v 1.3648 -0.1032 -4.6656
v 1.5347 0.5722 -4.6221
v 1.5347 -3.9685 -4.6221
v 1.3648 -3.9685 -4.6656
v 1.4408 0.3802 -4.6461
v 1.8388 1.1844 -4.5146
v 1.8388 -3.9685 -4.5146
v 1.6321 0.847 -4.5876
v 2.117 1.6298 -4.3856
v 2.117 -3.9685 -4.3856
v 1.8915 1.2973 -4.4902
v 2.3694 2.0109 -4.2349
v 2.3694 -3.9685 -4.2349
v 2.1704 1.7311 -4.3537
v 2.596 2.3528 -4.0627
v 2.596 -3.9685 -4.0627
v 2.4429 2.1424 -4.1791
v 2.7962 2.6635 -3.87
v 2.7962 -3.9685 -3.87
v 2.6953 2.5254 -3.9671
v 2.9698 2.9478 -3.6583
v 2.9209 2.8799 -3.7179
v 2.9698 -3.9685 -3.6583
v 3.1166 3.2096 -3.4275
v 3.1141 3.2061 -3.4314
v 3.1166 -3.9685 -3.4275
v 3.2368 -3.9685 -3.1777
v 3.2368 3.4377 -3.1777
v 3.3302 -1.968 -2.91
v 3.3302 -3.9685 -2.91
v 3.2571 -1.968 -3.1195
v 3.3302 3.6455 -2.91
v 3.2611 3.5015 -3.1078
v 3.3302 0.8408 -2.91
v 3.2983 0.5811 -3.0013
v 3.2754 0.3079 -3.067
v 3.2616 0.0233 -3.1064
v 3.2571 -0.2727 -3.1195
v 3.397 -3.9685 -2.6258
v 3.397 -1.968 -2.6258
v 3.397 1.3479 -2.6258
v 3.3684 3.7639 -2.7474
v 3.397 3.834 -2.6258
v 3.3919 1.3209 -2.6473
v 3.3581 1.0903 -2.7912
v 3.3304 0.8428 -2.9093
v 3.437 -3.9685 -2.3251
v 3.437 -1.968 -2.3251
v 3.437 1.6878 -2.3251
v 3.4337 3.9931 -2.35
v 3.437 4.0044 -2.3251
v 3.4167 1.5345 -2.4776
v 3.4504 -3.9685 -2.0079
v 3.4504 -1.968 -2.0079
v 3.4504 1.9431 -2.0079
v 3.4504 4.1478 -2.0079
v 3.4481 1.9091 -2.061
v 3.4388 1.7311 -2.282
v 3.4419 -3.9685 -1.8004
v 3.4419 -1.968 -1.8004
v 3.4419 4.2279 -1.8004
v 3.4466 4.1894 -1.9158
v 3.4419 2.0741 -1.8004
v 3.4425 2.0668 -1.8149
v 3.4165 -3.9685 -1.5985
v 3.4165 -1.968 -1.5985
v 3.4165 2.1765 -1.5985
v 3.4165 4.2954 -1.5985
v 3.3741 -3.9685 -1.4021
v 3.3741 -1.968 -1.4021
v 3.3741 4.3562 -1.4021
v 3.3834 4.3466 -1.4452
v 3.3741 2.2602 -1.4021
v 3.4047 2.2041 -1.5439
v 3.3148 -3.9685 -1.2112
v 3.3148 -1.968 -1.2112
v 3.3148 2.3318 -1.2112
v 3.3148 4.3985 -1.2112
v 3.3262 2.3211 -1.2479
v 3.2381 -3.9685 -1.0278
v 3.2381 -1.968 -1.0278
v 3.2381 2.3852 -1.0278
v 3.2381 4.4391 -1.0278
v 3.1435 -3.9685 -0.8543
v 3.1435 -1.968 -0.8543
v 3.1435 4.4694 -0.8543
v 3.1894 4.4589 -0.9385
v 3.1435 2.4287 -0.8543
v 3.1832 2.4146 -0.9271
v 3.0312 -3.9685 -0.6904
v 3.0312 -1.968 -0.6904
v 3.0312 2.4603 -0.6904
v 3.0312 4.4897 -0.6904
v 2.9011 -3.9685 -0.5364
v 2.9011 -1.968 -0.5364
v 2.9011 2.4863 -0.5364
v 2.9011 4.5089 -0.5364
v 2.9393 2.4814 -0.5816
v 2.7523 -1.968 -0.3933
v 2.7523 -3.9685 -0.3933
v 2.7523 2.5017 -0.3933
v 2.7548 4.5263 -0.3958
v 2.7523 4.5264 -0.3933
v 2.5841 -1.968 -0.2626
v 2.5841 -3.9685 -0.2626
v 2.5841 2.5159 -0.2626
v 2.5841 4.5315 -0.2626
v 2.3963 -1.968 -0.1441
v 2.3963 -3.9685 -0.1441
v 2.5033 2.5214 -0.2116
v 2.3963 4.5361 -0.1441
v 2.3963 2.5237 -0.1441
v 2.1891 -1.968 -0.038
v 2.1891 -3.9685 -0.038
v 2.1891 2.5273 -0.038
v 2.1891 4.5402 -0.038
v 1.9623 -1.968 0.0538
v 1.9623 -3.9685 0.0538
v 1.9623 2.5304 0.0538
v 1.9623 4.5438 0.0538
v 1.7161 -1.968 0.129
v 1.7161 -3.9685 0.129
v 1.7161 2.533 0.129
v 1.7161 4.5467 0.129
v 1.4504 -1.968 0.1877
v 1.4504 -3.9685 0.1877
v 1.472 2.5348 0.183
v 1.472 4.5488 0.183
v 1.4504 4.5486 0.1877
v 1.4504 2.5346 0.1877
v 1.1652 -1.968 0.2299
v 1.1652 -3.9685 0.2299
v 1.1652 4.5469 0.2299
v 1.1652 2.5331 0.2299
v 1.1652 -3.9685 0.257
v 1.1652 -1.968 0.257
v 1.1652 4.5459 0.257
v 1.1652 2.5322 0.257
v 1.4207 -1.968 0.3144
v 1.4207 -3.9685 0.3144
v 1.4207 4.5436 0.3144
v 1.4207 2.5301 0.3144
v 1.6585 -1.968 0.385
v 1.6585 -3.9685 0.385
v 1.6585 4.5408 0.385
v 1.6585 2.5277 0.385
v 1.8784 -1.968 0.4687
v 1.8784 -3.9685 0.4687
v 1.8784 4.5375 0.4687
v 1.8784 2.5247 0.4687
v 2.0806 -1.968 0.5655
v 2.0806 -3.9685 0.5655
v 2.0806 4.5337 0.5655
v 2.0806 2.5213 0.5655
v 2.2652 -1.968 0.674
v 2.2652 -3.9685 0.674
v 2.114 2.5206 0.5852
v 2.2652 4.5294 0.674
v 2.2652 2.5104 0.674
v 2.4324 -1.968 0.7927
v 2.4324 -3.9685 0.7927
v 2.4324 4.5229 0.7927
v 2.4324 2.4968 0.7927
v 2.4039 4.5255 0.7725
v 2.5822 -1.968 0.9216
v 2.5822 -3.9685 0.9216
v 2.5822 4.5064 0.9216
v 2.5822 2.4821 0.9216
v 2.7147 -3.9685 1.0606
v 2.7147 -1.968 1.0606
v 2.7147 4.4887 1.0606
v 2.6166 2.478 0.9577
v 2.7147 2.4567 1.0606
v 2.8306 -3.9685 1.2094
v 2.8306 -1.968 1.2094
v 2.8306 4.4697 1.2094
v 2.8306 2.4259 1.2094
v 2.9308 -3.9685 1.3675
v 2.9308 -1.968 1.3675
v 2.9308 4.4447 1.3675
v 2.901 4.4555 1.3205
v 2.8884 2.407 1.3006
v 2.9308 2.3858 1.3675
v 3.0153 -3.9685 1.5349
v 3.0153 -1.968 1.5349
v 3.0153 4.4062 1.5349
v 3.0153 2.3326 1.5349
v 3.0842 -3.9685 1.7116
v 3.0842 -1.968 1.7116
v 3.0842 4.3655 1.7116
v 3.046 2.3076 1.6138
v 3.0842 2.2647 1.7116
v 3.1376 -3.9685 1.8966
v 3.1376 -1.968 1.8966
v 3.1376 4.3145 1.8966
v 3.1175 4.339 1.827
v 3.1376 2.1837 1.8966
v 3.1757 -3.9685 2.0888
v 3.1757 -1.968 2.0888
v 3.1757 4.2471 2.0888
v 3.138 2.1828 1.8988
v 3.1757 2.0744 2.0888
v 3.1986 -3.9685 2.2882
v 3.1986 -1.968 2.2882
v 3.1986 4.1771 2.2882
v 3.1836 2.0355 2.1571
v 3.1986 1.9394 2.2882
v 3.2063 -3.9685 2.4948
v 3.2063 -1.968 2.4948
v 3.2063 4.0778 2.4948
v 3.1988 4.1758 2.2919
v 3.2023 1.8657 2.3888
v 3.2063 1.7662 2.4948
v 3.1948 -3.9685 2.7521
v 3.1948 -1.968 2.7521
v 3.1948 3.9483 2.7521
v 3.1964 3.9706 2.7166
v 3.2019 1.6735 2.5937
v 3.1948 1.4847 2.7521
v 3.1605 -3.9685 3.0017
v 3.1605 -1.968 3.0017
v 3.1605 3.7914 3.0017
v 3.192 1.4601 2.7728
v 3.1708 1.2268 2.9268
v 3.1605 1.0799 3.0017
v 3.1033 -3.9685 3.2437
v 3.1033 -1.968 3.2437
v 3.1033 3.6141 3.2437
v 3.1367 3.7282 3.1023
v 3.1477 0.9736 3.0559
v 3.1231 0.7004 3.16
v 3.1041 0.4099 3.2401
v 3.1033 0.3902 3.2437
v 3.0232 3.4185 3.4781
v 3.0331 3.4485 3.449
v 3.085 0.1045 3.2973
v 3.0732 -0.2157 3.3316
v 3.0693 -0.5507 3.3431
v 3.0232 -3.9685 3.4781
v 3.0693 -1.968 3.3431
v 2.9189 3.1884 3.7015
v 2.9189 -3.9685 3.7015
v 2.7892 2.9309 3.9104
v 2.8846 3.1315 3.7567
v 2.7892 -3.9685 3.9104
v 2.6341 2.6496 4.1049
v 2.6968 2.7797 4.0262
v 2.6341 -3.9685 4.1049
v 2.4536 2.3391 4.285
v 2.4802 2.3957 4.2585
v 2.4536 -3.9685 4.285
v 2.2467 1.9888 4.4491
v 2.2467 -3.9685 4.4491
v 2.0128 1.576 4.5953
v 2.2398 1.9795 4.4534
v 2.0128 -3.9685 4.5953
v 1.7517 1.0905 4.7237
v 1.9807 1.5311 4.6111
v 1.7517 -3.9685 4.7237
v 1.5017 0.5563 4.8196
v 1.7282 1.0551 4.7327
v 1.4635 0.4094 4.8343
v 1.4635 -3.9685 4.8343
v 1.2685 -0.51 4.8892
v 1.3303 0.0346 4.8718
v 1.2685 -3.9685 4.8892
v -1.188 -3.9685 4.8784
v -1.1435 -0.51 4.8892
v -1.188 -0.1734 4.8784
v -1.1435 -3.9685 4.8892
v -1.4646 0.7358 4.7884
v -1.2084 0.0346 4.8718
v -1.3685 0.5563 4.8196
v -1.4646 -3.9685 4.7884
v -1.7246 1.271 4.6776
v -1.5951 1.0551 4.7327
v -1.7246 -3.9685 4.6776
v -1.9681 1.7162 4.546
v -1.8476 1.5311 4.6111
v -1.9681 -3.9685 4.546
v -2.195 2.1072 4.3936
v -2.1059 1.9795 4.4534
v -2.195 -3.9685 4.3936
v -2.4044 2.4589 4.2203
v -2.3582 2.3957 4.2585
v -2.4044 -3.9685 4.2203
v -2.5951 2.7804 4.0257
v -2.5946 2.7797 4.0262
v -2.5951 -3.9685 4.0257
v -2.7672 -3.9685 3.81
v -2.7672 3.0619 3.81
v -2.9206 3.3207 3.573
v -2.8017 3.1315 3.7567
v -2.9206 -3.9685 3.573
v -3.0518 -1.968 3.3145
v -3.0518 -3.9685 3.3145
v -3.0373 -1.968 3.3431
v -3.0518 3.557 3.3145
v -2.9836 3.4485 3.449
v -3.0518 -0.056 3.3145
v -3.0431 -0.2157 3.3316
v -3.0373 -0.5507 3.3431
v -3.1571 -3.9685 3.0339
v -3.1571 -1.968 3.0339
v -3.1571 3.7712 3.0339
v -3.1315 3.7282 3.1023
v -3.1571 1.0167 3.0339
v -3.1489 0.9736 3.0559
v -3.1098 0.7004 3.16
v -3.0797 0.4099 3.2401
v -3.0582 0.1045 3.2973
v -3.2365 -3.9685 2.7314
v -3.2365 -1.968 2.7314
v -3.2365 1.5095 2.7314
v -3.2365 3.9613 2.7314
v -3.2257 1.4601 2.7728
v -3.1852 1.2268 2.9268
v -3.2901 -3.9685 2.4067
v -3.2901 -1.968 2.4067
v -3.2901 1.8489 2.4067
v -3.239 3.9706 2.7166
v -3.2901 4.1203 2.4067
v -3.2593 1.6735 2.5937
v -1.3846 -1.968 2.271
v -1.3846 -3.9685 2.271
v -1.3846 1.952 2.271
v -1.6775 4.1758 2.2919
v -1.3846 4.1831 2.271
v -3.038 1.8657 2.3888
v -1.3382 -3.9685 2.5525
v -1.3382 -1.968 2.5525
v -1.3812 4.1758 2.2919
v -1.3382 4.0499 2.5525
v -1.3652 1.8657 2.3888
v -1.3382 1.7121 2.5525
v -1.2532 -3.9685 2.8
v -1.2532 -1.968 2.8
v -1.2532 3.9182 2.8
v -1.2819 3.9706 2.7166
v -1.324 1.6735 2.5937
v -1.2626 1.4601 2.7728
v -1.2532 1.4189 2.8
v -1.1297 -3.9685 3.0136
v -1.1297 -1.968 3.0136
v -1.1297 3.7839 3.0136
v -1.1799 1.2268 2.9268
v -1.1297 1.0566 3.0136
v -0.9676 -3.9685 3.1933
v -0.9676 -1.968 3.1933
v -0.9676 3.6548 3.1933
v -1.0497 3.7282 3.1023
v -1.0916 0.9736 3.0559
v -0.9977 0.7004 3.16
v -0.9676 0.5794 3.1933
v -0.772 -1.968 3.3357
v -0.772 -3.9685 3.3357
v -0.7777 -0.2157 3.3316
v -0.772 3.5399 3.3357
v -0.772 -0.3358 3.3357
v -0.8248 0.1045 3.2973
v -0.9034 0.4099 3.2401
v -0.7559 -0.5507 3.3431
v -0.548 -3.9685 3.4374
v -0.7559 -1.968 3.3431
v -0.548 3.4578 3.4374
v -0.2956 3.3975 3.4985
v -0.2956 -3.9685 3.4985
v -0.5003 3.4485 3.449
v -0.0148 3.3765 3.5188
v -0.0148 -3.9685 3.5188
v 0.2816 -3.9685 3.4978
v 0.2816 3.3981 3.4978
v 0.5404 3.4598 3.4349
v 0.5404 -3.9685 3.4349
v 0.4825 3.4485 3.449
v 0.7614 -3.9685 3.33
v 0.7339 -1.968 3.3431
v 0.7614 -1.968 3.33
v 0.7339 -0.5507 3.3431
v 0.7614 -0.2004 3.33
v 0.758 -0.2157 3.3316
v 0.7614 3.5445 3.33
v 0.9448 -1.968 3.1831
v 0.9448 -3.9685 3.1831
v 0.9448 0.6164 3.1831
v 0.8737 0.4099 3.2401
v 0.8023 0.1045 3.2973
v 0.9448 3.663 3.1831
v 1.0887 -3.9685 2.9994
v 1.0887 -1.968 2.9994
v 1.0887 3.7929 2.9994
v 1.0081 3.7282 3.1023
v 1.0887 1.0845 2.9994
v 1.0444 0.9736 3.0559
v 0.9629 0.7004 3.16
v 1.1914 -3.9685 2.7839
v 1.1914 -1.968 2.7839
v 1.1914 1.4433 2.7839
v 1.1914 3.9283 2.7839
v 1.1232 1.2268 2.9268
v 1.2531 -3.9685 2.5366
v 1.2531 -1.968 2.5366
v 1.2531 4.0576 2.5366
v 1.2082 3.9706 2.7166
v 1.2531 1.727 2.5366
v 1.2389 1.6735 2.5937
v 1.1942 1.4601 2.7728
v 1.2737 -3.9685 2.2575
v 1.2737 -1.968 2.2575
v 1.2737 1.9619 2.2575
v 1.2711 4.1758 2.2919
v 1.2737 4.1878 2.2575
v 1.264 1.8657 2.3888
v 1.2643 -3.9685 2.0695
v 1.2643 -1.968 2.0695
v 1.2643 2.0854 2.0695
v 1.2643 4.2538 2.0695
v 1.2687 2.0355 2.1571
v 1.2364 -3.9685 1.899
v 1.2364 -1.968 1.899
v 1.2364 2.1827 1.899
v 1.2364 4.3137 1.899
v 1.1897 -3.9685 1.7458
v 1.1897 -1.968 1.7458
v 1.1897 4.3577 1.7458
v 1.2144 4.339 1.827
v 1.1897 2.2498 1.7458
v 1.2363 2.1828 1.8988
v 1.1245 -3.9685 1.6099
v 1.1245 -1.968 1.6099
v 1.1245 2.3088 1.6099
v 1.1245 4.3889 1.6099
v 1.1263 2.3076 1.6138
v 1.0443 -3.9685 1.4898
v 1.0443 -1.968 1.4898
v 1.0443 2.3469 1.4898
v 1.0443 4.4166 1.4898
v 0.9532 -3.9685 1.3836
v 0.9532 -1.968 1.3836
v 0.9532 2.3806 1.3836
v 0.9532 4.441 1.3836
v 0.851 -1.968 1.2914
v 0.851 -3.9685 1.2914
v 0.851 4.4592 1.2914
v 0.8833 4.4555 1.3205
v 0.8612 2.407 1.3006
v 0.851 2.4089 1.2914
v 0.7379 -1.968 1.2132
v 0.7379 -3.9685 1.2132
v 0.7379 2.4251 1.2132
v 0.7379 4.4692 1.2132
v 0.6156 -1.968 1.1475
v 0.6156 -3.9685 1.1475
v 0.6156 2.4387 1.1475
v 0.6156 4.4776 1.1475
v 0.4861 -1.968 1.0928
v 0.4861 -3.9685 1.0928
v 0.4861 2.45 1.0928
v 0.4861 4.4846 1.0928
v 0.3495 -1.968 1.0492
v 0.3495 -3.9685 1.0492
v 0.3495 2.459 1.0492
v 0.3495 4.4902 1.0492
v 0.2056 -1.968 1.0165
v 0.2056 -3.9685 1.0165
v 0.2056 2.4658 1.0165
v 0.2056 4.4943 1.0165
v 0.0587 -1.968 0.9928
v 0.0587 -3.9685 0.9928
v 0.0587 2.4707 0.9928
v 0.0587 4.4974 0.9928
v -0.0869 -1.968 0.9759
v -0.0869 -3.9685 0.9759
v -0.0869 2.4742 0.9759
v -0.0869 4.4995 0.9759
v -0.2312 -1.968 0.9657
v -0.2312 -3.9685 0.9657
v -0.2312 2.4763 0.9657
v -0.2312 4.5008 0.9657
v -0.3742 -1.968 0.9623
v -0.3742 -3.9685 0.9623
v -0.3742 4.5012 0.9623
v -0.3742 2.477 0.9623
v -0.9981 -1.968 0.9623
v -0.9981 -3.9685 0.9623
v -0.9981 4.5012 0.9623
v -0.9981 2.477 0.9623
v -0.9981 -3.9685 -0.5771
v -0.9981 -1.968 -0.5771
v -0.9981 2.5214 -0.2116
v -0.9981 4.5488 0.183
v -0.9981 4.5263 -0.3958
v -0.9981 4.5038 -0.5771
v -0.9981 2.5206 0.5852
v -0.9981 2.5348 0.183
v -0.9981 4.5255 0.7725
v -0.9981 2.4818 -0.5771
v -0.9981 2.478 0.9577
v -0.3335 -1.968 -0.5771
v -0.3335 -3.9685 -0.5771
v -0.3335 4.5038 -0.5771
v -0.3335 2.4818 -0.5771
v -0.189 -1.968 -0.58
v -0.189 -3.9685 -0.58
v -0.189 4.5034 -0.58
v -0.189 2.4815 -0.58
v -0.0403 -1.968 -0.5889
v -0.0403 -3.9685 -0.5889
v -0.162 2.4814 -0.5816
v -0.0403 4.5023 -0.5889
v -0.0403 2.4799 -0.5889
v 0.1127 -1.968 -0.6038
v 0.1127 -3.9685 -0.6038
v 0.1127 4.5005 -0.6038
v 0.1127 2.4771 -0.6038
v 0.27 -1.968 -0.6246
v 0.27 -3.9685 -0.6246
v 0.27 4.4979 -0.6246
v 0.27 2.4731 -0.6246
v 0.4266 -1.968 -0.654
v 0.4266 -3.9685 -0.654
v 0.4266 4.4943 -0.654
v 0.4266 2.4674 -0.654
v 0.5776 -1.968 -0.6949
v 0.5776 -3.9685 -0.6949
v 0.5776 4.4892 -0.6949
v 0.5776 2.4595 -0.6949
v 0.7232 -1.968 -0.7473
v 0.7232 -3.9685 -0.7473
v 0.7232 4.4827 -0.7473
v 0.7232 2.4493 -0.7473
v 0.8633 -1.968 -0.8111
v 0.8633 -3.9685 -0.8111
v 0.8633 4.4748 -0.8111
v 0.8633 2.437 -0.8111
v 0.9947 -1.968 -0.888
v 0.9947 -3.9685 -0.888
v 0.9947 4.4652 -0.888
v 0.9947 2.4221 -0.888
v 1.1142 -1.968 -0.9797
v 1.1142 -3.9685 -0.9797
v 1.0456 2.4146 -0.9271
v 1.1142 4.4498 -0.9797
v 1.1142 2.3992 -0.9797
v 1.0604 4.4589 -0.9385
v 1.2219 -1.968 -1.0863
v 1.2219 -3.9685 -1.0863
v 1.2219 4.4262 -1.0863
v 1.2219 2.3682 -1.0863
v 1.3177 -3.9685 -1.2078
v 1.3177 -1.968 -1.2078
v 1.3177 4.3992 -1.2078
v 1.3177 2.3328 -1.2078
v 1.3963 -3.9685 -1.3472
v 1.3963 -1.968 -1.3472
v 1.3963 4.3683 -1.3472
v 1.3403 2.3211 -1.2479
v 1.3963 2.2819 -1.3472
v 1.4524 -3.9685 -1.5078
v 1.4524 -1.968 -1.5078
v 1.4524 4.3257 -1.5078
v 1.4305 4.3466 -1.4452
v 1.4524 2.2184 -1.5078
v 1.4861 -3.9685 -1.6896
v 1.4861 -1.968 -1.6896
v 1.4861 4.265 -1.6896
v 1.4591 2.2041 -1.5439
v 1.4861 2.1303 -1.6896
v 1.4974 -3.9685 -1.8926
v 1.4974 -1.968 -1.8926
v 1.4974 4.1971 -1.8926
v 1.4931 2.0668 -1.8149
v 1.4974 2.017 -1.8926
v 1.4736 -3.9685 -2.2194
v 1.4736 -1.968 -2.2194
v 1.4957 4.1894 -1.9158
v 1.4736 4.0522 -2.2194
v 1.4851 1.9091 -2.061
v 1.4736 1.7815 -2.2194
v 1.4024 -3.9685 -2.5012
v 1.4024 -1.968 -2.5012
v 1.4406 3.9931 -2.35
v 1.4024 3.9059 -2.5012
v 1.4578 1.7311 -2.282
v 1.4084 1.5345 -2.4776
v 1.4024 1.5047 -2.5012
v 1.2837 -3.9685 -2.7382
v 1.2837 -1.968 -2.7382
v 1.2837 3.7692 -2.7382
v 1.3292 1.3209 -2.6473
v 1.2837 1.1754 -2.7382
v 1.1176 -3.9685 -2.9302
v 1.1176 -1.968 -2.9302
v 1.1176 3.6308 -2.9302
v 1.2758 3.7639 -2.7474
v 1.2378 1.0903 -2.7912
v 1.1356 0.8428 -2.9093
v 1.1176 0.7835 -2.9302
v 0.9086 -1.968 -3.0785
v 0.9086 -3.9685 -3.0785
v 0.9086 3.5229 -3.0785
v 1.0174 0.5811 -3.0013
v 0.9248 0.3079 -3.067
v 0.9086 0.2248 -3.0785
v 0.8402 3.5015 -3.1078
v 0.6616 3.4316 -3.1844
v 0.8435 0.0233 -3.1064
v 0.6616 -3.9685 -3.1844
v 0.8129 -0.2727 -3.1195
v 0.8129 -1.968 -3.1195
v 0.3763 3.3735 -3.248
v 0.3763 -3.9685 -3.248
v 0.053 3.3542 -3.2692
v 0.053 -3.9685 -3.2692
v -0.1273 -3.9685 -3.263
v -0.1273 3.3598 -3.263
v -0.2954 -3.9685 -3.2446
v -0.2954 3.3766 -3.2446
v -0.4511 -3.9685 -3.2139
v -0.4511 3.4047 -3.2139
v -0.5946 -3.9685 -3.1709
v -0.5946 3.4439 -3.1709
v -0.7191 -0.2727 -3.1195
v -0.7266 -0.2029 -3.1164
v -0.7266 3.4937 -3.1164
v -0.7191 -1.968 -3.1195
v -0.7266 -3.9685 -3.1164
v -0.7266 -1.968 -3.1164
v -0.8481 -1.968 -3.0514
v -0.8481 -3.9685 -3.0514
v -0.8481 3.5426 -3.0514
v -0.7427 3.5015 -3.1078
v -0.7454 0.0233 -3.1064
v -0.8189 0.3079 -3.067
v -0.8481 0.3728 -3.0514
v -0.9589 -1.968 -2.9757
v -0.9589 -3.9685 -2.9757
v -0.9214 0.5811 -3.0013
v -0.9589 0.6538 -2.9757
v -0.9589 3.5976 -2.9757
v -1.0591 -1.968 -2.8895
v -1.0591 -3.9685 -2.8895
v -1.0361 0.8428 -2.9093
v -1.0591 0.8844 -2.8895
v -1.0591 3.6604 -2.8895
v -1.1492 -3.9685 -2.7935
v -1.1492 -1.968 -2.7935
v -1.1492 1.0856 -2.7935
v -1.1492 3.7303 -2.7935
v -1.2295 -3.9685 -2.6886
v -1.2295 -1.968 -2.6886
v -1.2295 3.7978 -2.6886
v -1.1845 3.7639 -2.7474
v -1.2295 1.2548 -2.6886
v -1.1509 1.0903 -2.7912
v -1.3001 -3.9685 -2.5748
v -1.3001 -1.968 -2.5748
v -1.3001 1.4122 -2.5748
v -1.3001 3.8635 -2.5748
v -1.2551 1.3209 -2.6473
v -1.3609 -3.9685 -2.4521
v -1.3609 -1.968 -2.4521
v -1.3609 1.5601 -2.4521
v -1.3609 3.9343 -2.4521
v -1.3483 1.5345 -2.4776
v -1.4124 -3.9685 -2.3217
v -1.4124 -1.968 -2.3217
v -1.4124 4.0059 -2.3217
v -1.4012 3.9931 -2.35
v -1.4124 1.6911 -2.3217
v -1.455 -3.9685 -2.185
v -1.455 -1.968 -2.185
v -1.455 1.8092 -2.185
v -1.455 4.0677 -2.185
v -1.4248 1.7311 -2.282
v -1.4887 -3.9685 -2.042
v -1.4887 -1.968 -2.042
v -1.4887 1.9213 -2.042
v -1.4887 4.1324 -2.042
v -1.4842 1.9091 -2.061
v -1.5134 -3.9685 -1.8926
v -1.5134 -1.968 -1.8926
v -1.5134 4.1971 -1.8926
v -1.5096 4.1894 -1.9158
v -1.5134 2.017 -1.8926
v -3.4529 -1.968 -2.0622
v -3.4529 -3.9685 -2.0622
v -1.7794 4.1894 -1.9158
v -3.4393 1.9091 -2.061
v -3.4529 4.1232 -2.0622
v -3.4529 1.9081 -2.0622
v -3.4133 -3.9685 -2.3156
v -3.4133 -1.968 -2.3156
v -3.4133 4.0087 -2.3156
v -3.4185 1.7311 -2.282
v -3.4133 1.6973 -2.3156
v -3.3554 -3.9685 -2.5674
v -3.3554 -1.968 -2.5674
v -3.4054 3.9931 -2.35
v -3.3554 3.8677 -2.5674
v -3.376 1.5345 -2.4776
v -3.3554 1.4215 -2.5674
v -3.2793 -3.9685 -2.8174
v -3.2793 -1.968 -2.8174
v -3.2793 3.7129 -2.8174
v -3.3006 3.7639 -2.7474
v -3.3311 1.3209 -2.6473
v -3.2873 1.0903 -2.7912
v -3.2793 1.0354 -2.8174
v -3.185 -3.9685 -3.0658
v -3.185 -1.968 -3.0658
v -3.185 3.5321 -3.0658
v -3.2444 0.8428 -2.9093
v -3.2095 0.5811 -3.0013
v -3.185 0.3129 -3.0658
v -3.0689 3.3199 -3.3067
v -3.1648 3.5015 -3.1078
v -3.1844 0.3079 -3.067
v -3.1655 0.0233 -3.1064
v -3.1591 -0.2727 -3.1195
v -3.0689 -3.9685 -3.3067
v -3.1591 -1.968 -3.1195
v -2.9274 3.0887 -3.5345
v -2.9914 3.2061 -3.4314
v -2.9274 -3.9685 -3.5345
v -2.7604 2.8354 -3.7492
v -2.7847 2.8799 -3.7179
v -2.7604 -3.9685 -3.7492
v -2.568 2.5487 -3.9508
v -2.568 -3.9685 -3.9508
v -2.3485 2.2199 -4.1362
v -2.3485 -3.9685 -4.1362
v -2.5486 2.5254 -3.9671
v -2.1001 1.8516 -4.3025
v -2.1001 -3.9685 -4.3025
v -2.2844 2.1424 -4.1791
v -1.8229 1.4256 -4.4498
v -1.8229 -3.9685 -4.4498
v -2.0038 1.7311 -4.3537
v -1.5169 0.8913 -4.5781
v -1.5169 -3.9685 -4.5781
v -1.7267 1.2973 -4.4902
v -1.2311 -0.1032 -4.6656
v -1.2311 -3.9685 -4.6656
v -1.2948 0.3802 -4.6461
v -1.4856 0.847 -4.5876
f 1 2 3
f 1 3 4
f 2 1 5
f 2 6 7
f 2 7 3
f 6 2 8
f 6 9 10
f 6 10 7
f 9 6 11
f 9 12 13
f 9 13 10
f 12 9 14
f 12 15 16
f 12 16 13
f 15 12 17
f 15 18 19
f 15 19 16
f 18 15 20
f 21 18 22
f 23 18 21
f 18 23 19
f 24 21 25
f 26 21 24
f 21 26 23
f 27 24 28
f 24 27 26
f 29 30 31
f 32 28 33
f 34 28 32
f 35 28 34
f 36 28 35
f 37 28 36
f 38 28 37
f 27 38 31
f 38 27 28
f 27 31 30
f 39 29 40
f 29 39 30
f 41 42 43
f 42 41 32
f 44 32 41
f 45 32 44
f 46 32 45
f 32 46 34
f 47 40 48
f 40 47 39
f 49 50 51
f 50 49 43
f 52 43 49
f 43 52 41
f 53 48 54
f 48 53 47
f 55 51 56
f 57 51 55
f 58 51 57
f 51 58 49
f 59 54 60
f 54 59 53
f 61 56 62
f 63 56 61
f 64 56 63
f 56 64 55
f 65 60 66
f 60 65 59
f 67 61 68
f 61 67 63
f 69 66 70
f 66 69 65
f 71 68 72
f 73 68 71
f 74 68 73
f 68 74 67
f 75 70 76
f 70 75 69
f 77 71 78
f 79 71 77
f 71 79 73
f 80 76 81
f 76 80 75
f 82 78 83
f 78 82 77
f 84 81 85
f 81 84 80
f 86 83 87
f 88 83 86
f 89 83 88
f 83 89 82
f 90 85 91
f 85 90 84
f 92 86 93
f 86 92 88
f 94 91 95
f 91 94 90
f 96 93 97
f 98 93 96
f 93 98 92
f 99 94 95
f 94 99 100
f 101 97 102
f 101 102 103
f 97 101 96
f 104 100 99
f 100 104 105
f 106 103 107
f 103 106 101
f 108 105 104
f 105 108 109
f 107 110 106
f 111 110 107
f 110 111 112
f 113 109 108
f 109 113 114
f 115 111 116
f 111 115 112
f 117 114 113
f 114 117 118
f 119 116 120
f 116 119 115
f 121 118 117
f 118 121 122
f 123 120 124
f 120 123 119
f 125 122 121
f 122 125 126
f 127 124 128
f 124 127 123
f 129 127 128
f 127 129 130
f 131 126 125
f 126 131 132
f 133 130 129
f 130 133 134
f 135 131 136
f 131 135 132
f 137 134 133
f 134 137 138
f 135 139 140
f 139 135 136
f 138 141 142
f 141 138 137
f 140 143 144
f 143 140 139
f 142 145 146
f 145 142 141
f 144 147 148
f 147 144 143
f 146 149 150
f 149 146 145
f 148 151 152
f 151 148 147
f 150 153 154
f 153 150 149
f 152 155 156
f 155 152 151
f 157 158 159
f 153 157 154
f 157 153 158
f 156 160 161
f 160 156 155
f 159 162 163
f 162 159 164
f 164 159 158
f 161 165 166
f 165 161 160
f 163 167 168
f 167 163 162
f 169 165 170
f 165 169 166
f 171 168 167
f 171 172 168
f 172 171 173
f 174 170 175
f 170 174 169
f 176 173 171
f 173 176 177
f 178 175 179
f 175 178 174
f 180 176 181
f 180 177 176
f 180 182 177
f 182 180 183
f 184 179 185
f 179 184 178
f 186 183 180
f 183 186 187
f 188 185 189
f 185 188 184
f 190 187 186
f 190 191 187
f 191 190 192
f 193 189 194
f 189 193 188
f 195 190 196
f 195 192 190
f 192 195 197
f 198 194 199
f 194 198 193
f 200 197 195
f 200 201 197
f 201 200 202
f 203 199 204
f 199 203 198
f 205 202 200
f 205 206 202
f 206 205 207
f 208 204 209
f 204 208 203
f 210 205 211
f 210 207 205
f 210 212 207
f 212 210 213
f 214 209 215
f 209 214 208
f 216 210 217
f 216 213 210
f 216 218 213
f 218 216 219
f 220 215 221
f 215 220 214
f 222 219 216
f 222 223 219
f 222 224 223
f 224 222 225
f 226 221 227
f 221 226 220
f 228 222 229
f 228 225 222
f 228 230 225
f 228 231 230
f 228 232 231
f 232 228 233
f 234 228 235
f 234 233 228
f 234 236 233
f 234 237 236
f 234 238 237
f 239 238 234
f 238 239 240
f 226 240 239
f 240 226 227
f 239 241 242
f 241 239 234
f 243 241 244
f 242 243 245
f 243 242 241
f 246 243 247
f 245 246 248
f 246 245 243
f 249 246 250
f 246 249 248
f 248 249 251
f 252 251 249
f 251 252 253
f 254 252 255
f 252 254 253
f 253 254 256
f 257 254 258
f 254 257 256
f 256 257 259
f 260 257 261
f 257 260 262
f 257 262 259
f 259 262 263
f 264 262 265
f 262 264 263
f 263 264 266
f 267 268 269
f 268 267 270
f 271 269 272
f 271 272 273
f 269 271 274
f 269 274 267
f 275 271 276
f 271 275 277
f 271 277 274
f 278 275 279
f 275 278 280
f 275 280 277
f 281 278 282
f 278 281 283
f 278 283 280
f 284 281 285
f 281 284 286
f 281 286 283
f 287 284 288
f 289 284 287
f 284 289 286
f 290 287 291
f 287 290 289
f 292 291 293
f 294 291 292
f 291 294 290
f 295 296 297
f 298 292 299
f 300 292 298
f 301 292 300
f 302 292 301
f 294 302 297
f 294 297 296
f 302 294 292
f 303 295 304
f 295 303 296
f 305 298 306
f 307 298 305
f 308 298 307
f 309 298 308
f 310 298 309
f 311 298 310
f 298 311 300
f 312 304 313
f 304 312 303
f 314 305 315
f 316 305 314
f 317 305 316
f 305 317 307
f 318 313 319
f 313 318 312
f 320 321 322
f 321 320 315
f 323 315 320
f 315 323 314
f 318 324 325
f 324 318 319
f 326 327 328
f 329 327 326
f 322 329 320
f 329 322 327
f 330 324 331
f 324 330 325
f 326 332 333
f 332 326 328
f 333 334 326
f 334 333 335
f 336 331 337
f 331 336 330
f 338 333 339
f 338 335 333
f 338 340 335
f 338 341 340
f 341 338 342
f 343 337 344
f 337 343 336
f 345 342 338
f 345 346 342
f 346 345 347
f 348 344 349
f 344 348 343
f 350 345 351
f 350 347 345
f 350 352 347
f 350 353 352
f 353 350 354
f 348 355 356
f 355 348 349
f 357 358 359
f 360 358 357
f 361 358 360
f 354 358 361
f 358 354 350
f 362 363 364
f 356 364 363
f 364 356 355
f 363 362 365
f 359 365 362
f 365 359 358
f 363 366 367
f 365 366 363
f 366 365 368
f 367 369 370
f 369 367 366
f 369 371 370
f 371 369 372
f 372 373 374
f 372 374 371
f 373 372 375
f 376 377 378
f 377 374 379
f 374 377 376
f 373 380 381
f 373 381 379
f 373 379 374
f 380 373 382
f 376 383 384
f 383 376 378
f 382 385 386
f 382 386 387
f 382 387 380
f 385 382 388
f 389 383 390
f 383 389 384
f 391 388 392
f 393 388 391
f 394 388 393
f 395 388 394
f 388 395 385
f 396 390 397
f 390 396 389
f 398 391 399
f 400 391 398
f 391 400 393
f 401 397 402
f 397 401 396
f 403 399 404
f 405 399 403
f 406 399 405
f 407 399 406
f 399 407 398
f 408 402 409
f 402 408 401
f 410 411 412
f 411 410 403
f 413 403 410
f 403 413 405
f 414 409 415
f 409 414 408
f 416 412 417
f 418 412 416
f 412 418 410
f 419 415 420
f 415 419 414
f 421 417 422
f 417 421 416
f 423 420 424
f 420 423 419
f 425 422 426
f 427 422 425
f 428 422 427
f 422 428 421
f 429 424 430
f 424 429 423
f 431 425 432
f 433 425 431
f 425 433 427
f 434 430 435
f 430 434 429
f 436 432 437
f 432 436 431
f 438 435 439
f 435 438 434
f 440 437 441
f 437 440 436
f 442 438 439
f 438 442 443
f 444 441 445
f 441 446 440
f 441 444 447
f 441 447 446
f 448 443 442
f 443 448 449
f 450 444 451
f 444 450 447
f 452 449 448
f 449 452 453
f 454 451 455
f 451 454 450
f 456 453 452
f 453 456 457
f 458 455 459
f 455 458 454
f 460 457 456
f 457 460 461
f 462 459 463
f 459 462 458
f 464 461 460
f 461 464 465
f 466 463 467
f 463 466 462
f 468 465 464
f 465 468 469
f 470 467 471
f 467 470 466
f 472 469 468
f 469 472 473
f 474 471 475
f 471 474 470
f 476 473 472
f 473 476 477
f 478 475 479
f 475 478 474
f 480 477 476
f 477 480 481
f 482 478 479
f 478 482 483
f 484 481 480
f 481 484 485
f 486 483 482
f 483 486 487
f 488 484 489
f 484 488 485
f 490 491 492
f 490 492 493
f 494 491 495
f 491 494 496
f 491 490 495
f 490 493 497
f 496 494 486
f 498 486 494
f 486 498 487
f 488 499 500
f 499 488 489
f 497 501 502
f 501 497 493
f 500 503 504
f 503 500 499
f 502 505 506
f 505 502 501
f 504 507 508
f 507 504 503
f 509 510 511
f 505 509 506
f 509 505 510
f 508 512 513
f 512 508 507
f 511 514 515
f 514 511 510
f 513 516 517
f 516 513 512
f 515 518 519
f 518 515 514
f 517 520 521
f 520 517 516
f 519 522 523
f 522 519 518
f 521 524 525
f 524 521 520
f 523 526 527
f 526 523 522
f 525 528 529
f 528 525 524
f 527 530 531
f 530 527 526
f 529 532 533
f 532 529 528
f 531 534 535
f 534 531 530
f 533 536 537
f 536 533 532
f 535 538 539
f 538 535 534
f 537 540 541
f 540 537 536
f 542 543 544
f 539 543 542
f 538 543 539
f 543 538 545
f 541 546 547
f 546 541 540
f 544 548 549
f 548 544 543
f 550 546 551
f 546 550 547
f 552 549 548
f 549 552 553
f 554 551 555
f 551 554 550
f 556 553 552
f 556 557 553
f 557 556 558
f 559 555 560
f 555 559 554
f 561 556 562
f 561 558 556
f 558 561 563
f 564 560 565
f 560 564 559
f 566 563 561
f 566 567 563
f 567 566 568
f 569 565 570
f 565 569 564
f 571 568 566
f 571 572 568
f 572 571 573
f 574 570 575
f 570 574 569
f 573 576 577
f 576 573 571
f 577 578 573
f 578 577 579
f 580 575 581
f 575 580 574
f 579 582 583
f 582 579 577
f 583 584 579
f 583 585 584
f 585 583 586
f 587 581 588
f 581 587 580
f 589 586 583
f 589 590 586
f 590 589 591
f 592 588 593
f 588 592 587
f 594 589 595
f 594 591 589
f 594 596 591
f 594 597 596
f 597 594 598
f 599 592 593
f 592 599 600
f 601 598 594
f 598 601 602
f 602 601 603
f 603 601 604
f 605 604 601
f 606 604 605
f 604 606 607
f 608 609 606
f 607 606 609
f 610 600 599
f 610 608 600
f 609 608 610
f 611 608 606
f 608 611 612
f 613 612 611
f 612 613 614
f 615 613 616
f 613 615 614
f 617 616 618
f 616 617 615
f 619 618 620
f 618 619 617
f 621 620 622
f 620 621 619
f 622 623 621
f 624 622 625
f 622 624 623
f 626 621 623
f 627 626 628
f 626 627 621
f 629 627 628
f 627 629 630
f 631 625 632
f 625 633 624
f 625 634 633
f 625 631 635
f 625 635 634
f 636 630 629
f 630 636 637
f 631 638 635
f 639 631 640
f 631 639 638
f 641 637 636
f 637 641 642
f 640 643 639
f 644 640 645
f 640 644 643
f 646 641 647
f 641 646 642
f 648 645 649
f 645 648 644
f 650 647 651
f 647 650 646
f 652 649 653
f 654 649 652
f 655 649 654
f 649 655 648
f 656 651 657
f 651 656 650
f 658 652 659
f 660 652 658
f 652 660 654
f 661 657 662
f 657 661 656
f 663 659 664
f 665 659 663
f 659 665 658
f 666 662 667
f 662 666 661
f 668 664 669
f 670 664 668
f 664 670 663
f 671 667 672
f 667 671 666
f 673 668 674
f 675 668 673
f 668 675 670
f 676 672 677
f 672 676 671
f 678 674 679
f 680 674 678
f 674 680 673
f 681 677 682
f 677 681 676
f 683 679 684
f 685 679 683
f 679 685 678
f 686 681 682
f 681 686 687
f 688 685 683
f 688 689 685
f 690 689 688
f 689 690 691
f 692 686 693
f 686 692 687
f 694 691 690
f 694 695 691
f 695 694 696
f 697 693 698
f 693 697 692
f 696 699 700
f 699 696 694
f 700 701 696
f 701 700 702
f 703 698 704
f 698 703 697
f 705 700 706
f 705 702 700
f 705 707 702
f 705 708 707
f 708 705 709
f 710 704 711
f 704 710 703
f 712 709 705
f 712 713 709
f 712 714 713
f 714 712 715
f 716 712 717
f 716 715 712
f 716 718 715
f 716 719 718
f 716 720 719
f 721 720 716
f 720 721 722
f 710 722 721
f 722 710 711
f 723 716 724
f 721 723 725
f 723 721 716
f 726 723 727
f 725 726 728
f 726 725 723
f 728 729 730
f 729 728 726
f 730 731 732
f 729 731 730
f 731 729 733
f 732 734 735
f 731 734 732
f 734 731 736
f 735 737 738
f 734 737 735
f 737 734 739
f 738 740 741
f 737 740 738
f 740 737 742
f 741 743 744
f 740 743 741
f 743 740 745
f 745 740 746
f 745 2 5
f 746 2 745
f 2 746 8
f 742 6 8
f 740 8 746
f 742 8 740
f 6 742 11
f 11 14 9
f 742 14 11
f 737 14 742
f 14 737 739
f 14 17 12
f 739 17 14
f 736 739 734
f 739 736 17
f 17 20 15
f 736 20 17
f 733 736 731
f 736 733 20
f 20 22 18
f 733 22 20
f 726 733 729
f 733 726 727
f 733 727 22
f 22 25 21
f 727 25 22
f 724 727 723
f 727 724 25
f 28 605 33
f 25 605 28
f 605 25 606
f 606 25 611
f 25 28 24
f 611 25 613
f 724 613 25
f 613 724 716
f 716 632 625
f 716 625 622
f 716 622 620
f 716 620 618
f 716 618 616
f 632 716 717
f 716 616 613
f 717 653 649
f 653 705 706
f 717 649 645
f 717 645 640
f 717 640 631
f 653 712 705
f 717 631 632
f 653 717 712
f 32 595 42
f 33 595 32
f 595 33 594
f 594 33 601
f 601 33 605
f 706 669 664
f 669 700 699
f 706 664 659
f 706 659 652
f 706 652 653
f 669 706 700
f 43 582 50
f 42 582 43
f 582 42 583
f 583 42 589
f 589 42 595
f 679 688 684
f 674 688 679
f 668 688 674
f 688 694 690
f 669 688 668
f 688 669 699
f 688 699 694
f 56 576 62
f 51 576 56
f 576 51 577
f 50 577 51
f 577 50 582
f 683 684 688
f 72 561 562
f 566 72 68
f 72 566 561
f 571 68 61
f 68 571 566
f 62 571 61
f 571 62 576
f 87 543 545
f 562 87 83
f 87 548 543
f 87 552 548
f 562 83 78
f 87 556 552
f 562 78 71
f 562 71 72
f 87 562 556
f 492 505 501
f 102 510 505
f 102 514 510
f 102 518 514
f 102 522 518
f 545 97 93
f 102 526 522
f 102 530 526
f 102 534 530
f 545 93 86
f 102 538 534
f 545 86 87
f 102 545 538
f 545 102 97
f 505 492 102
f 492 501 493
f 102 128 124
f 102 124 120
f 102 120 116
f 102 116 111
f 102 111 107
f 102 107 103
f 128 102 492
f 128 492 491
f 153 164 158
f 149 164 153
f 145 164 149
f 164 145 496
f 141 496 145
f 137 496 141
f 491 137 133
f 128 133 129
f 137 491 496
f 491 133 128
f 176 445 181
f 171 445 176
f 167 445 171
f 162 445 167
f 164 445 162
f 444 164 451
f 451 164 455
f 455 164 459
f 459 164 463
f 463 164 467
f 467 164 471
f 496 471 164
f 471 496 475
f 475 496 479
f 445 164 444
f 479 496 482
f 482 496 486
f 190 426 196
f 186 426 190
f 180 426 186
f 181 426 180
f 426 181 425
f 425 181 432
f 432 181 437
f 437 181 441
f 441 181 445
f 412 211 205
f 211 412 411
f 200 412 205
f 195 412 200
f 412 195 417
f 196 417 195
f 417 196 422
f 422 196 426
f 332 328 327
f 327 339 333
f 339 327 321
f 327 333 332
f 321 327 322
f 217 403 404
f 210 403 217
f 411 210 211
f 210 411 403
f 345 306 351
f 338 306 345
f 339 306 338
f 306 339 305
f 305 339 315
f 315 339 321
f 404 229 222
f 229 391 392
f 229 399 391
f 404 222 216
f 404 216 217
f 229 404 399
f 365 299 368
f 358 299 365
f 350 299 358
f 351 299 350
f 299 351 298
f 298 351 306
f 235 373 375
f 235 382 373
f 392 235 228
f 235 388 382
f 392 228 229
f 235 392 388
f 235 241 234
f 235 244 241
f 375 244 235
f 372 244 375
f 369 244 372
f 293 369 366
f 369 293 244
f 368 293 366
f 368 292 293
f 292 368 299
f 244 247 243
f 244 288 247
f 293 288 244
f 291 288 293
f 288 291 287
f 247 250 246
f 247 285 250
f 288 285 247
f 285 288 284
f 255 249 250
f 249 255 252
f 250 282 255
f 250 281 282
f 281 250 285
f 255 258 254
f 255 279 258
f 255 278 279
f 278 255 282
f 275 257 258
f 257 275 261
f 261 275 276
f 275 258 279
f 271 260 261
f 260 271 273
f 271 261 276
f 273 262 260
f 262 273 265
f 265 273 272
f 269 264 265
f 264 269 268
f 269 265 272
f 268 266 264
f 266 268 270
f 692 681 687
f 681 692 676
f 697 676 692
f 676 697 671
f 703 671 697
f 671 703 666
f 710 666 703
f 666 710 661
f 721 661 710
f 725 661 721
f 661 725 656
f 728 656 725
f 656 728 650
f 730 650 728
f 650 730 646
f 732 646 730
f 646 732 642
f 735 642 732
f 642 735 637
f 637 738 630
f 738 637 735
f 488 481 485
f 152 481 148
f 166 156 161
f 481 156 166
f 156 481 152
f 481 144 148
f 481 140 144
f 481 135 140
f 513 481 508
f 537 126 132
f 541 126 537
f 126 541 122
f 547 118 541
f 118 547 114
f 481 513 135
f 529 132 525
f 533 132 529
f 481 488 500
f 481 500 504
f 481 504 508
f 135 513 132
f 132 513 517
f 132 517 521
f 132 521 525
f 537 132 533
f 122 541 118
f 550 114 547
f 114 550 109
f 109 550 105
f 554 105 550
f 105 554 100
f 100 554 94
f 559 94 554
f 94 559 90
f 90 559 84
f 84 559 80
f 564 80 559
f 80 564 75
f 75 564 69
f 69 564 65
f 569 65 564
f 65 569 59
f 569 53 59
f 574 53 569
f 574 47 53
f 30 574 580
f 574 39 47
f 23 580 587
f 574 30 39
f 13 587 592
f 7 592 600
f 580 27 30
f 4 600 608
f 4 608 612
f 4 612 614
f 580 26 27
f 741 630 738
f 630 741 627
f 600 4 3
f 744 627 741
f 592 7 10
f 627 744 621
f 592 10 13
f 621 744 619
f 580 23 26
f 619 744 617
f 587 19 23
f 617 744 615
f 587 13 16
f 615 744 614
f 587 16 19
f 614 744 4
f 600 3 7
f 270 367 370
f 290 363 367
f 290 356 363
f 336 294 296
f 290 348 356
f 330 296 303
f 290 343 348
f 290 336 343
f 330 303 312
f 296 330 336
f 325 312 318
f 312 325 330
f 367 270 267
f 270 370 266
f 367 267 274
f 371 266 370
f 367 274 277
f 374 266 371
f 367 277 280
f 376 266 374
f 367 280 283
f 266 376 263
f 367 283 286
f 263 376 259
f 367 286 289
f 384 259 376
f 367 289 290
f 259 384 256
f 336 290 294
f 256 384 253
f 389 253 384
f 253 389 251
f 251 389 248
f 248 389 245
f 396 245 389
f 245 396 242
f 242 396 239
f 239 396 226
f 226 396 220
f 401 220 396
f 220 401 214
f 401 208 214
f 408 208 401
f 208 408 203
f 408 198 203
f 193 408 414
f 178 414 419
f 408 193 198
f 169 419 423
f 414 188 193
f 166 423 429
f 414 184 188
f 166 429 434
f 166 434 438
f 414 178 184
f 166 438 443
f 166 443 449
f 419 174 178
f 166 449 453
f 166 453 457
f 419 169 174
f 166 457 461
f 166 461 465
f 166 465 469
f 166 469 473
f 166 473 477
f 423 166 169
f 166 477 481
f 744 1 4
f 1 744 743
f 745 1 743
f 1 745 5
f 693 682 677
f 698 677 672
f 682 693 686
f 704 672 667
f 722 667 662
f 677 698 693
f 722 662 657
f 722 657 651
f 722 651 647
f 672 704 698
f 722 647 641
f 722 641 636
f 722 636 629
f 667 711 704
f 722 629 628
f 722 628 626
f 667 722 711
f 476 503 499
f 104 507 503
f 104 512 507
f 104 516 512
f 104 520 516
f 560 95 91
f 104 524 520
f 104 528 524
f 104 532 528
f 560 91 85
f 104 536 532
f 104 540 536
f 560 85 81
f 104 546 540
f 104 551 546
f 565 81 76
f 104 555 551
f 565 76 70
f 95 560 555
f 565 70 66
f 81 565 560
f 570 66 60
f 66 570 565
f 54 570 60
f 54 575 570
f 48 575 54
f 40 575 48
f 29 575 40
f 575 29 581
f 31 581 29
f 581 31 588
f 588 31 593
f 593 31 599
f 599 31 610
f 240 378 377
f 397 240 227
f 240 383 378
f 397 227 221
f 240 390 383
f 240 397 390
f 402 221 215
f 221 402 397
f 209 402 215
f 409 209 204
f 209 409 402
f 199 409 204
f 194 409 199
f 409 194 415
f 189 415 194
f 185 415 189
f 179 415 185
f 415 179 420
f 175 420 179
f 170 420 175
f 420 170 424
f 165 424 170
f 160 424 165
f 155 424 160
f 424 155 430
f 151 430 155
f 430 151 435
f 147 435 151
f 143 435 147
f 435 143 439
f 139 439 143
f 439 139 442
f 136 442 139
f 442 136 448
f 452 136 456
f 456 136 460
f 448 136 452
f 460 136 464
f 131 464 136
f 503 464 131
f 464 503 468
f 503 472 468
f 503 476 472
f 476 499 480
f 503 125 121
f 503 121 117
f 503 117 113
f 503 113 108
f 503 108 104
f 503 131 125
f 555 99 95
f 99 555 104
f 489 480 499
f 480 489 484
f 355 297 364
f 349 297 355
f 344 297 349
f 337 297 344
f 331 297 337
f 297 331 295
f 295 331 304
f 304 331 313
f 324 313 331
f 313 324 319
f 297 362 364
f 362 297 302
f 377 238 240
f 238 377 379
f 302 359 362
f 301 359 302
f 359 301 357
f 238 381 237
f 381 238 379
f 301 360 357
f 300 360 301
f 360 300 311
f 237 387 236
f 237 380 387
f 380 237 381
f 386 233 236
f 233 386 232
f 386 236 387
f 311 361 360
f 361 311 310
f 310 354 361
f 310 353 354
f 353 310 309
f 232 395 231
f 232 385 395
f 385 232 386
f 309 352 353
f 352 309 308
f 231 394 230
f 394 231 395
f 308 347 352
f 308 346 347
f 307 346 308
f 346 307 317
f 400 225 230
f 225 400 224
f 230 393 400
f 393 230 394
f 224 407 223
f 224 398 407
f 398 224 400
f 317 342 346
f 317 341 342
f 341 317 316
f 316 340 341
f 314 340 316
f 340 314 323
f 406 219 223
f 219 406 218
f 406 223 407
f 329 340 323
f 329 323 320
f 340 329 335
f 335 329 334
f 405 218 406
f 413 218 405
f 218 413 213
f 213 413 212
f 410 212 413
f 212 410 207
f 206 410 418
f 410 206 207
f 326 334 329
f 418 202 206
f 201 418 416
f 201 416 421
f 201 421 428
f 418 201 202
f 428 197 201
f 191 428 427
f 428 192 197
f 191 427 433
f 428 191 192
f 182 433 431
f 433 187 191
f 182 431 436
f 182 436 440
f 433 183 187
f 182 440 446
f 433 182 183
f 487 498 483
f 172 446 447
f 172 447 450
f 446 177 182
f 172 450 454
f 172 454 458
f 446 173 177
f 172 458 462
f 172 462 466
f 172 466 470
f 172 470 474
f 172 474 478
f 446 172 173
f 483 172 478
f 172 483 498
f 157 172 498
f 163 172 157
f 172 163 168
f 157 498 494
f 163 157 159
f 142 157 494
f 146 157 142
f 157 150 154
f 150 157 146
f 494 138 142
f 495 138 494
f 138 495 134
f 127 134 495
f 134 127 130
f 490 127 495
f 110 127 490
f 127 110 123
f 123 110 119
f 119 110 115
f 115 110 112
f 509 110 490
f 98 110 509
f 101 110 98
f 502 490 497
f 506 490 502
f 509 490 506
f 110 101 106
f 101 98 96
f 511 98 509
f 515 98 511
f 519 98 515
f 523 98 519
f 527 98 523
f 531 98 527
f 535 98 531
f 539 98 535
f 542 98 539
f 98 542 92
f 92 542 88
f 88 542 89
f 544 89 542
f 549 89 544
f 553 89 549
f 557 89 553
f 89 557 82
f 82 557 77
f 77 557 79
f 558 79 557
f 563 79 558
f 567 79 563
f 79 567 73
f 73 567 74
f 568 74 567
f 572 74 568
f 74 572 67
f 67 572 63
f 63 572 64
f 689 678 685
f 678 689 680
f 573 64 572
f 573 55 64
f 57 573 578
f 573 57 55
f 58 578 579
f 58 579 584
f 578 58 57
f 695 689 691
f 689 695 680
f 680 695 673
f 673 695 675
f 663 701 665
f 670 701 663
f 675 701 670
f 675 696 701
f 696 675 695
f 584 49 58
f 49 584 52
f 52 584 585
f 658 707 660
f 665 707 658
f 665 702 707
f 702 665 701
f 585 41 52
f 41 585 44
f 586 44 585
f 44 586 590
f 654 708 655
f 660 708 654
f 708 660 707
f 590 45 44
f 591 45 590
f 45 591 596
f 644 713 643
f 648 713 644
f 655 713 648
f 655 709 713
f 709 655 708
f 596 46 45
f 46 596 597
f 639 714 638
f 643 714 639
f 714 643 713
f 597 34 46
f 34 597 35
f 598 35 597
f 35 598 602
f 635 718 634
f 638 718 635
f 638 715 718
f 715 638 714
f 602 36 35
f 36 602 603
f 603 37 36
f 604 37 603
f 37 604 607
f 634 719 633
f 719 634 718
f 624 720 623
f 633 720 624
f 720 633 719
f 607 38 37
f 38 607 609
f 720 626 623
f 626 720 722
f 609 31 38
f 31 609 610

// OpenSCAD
character1="3";
character2="D";

intersection() {
rotate([90,0,0]) linear_extrude(height = 100, center=true) text(character1, font = "arial:style=Bold", "center", size = 10, valign="center", halign="center");

rotate([90,0,90]) linear_extrude(height = 100, center=true) text(character2, font = "arial:style=Bold", "center", size = 10, valign="center", halign="center");
}
